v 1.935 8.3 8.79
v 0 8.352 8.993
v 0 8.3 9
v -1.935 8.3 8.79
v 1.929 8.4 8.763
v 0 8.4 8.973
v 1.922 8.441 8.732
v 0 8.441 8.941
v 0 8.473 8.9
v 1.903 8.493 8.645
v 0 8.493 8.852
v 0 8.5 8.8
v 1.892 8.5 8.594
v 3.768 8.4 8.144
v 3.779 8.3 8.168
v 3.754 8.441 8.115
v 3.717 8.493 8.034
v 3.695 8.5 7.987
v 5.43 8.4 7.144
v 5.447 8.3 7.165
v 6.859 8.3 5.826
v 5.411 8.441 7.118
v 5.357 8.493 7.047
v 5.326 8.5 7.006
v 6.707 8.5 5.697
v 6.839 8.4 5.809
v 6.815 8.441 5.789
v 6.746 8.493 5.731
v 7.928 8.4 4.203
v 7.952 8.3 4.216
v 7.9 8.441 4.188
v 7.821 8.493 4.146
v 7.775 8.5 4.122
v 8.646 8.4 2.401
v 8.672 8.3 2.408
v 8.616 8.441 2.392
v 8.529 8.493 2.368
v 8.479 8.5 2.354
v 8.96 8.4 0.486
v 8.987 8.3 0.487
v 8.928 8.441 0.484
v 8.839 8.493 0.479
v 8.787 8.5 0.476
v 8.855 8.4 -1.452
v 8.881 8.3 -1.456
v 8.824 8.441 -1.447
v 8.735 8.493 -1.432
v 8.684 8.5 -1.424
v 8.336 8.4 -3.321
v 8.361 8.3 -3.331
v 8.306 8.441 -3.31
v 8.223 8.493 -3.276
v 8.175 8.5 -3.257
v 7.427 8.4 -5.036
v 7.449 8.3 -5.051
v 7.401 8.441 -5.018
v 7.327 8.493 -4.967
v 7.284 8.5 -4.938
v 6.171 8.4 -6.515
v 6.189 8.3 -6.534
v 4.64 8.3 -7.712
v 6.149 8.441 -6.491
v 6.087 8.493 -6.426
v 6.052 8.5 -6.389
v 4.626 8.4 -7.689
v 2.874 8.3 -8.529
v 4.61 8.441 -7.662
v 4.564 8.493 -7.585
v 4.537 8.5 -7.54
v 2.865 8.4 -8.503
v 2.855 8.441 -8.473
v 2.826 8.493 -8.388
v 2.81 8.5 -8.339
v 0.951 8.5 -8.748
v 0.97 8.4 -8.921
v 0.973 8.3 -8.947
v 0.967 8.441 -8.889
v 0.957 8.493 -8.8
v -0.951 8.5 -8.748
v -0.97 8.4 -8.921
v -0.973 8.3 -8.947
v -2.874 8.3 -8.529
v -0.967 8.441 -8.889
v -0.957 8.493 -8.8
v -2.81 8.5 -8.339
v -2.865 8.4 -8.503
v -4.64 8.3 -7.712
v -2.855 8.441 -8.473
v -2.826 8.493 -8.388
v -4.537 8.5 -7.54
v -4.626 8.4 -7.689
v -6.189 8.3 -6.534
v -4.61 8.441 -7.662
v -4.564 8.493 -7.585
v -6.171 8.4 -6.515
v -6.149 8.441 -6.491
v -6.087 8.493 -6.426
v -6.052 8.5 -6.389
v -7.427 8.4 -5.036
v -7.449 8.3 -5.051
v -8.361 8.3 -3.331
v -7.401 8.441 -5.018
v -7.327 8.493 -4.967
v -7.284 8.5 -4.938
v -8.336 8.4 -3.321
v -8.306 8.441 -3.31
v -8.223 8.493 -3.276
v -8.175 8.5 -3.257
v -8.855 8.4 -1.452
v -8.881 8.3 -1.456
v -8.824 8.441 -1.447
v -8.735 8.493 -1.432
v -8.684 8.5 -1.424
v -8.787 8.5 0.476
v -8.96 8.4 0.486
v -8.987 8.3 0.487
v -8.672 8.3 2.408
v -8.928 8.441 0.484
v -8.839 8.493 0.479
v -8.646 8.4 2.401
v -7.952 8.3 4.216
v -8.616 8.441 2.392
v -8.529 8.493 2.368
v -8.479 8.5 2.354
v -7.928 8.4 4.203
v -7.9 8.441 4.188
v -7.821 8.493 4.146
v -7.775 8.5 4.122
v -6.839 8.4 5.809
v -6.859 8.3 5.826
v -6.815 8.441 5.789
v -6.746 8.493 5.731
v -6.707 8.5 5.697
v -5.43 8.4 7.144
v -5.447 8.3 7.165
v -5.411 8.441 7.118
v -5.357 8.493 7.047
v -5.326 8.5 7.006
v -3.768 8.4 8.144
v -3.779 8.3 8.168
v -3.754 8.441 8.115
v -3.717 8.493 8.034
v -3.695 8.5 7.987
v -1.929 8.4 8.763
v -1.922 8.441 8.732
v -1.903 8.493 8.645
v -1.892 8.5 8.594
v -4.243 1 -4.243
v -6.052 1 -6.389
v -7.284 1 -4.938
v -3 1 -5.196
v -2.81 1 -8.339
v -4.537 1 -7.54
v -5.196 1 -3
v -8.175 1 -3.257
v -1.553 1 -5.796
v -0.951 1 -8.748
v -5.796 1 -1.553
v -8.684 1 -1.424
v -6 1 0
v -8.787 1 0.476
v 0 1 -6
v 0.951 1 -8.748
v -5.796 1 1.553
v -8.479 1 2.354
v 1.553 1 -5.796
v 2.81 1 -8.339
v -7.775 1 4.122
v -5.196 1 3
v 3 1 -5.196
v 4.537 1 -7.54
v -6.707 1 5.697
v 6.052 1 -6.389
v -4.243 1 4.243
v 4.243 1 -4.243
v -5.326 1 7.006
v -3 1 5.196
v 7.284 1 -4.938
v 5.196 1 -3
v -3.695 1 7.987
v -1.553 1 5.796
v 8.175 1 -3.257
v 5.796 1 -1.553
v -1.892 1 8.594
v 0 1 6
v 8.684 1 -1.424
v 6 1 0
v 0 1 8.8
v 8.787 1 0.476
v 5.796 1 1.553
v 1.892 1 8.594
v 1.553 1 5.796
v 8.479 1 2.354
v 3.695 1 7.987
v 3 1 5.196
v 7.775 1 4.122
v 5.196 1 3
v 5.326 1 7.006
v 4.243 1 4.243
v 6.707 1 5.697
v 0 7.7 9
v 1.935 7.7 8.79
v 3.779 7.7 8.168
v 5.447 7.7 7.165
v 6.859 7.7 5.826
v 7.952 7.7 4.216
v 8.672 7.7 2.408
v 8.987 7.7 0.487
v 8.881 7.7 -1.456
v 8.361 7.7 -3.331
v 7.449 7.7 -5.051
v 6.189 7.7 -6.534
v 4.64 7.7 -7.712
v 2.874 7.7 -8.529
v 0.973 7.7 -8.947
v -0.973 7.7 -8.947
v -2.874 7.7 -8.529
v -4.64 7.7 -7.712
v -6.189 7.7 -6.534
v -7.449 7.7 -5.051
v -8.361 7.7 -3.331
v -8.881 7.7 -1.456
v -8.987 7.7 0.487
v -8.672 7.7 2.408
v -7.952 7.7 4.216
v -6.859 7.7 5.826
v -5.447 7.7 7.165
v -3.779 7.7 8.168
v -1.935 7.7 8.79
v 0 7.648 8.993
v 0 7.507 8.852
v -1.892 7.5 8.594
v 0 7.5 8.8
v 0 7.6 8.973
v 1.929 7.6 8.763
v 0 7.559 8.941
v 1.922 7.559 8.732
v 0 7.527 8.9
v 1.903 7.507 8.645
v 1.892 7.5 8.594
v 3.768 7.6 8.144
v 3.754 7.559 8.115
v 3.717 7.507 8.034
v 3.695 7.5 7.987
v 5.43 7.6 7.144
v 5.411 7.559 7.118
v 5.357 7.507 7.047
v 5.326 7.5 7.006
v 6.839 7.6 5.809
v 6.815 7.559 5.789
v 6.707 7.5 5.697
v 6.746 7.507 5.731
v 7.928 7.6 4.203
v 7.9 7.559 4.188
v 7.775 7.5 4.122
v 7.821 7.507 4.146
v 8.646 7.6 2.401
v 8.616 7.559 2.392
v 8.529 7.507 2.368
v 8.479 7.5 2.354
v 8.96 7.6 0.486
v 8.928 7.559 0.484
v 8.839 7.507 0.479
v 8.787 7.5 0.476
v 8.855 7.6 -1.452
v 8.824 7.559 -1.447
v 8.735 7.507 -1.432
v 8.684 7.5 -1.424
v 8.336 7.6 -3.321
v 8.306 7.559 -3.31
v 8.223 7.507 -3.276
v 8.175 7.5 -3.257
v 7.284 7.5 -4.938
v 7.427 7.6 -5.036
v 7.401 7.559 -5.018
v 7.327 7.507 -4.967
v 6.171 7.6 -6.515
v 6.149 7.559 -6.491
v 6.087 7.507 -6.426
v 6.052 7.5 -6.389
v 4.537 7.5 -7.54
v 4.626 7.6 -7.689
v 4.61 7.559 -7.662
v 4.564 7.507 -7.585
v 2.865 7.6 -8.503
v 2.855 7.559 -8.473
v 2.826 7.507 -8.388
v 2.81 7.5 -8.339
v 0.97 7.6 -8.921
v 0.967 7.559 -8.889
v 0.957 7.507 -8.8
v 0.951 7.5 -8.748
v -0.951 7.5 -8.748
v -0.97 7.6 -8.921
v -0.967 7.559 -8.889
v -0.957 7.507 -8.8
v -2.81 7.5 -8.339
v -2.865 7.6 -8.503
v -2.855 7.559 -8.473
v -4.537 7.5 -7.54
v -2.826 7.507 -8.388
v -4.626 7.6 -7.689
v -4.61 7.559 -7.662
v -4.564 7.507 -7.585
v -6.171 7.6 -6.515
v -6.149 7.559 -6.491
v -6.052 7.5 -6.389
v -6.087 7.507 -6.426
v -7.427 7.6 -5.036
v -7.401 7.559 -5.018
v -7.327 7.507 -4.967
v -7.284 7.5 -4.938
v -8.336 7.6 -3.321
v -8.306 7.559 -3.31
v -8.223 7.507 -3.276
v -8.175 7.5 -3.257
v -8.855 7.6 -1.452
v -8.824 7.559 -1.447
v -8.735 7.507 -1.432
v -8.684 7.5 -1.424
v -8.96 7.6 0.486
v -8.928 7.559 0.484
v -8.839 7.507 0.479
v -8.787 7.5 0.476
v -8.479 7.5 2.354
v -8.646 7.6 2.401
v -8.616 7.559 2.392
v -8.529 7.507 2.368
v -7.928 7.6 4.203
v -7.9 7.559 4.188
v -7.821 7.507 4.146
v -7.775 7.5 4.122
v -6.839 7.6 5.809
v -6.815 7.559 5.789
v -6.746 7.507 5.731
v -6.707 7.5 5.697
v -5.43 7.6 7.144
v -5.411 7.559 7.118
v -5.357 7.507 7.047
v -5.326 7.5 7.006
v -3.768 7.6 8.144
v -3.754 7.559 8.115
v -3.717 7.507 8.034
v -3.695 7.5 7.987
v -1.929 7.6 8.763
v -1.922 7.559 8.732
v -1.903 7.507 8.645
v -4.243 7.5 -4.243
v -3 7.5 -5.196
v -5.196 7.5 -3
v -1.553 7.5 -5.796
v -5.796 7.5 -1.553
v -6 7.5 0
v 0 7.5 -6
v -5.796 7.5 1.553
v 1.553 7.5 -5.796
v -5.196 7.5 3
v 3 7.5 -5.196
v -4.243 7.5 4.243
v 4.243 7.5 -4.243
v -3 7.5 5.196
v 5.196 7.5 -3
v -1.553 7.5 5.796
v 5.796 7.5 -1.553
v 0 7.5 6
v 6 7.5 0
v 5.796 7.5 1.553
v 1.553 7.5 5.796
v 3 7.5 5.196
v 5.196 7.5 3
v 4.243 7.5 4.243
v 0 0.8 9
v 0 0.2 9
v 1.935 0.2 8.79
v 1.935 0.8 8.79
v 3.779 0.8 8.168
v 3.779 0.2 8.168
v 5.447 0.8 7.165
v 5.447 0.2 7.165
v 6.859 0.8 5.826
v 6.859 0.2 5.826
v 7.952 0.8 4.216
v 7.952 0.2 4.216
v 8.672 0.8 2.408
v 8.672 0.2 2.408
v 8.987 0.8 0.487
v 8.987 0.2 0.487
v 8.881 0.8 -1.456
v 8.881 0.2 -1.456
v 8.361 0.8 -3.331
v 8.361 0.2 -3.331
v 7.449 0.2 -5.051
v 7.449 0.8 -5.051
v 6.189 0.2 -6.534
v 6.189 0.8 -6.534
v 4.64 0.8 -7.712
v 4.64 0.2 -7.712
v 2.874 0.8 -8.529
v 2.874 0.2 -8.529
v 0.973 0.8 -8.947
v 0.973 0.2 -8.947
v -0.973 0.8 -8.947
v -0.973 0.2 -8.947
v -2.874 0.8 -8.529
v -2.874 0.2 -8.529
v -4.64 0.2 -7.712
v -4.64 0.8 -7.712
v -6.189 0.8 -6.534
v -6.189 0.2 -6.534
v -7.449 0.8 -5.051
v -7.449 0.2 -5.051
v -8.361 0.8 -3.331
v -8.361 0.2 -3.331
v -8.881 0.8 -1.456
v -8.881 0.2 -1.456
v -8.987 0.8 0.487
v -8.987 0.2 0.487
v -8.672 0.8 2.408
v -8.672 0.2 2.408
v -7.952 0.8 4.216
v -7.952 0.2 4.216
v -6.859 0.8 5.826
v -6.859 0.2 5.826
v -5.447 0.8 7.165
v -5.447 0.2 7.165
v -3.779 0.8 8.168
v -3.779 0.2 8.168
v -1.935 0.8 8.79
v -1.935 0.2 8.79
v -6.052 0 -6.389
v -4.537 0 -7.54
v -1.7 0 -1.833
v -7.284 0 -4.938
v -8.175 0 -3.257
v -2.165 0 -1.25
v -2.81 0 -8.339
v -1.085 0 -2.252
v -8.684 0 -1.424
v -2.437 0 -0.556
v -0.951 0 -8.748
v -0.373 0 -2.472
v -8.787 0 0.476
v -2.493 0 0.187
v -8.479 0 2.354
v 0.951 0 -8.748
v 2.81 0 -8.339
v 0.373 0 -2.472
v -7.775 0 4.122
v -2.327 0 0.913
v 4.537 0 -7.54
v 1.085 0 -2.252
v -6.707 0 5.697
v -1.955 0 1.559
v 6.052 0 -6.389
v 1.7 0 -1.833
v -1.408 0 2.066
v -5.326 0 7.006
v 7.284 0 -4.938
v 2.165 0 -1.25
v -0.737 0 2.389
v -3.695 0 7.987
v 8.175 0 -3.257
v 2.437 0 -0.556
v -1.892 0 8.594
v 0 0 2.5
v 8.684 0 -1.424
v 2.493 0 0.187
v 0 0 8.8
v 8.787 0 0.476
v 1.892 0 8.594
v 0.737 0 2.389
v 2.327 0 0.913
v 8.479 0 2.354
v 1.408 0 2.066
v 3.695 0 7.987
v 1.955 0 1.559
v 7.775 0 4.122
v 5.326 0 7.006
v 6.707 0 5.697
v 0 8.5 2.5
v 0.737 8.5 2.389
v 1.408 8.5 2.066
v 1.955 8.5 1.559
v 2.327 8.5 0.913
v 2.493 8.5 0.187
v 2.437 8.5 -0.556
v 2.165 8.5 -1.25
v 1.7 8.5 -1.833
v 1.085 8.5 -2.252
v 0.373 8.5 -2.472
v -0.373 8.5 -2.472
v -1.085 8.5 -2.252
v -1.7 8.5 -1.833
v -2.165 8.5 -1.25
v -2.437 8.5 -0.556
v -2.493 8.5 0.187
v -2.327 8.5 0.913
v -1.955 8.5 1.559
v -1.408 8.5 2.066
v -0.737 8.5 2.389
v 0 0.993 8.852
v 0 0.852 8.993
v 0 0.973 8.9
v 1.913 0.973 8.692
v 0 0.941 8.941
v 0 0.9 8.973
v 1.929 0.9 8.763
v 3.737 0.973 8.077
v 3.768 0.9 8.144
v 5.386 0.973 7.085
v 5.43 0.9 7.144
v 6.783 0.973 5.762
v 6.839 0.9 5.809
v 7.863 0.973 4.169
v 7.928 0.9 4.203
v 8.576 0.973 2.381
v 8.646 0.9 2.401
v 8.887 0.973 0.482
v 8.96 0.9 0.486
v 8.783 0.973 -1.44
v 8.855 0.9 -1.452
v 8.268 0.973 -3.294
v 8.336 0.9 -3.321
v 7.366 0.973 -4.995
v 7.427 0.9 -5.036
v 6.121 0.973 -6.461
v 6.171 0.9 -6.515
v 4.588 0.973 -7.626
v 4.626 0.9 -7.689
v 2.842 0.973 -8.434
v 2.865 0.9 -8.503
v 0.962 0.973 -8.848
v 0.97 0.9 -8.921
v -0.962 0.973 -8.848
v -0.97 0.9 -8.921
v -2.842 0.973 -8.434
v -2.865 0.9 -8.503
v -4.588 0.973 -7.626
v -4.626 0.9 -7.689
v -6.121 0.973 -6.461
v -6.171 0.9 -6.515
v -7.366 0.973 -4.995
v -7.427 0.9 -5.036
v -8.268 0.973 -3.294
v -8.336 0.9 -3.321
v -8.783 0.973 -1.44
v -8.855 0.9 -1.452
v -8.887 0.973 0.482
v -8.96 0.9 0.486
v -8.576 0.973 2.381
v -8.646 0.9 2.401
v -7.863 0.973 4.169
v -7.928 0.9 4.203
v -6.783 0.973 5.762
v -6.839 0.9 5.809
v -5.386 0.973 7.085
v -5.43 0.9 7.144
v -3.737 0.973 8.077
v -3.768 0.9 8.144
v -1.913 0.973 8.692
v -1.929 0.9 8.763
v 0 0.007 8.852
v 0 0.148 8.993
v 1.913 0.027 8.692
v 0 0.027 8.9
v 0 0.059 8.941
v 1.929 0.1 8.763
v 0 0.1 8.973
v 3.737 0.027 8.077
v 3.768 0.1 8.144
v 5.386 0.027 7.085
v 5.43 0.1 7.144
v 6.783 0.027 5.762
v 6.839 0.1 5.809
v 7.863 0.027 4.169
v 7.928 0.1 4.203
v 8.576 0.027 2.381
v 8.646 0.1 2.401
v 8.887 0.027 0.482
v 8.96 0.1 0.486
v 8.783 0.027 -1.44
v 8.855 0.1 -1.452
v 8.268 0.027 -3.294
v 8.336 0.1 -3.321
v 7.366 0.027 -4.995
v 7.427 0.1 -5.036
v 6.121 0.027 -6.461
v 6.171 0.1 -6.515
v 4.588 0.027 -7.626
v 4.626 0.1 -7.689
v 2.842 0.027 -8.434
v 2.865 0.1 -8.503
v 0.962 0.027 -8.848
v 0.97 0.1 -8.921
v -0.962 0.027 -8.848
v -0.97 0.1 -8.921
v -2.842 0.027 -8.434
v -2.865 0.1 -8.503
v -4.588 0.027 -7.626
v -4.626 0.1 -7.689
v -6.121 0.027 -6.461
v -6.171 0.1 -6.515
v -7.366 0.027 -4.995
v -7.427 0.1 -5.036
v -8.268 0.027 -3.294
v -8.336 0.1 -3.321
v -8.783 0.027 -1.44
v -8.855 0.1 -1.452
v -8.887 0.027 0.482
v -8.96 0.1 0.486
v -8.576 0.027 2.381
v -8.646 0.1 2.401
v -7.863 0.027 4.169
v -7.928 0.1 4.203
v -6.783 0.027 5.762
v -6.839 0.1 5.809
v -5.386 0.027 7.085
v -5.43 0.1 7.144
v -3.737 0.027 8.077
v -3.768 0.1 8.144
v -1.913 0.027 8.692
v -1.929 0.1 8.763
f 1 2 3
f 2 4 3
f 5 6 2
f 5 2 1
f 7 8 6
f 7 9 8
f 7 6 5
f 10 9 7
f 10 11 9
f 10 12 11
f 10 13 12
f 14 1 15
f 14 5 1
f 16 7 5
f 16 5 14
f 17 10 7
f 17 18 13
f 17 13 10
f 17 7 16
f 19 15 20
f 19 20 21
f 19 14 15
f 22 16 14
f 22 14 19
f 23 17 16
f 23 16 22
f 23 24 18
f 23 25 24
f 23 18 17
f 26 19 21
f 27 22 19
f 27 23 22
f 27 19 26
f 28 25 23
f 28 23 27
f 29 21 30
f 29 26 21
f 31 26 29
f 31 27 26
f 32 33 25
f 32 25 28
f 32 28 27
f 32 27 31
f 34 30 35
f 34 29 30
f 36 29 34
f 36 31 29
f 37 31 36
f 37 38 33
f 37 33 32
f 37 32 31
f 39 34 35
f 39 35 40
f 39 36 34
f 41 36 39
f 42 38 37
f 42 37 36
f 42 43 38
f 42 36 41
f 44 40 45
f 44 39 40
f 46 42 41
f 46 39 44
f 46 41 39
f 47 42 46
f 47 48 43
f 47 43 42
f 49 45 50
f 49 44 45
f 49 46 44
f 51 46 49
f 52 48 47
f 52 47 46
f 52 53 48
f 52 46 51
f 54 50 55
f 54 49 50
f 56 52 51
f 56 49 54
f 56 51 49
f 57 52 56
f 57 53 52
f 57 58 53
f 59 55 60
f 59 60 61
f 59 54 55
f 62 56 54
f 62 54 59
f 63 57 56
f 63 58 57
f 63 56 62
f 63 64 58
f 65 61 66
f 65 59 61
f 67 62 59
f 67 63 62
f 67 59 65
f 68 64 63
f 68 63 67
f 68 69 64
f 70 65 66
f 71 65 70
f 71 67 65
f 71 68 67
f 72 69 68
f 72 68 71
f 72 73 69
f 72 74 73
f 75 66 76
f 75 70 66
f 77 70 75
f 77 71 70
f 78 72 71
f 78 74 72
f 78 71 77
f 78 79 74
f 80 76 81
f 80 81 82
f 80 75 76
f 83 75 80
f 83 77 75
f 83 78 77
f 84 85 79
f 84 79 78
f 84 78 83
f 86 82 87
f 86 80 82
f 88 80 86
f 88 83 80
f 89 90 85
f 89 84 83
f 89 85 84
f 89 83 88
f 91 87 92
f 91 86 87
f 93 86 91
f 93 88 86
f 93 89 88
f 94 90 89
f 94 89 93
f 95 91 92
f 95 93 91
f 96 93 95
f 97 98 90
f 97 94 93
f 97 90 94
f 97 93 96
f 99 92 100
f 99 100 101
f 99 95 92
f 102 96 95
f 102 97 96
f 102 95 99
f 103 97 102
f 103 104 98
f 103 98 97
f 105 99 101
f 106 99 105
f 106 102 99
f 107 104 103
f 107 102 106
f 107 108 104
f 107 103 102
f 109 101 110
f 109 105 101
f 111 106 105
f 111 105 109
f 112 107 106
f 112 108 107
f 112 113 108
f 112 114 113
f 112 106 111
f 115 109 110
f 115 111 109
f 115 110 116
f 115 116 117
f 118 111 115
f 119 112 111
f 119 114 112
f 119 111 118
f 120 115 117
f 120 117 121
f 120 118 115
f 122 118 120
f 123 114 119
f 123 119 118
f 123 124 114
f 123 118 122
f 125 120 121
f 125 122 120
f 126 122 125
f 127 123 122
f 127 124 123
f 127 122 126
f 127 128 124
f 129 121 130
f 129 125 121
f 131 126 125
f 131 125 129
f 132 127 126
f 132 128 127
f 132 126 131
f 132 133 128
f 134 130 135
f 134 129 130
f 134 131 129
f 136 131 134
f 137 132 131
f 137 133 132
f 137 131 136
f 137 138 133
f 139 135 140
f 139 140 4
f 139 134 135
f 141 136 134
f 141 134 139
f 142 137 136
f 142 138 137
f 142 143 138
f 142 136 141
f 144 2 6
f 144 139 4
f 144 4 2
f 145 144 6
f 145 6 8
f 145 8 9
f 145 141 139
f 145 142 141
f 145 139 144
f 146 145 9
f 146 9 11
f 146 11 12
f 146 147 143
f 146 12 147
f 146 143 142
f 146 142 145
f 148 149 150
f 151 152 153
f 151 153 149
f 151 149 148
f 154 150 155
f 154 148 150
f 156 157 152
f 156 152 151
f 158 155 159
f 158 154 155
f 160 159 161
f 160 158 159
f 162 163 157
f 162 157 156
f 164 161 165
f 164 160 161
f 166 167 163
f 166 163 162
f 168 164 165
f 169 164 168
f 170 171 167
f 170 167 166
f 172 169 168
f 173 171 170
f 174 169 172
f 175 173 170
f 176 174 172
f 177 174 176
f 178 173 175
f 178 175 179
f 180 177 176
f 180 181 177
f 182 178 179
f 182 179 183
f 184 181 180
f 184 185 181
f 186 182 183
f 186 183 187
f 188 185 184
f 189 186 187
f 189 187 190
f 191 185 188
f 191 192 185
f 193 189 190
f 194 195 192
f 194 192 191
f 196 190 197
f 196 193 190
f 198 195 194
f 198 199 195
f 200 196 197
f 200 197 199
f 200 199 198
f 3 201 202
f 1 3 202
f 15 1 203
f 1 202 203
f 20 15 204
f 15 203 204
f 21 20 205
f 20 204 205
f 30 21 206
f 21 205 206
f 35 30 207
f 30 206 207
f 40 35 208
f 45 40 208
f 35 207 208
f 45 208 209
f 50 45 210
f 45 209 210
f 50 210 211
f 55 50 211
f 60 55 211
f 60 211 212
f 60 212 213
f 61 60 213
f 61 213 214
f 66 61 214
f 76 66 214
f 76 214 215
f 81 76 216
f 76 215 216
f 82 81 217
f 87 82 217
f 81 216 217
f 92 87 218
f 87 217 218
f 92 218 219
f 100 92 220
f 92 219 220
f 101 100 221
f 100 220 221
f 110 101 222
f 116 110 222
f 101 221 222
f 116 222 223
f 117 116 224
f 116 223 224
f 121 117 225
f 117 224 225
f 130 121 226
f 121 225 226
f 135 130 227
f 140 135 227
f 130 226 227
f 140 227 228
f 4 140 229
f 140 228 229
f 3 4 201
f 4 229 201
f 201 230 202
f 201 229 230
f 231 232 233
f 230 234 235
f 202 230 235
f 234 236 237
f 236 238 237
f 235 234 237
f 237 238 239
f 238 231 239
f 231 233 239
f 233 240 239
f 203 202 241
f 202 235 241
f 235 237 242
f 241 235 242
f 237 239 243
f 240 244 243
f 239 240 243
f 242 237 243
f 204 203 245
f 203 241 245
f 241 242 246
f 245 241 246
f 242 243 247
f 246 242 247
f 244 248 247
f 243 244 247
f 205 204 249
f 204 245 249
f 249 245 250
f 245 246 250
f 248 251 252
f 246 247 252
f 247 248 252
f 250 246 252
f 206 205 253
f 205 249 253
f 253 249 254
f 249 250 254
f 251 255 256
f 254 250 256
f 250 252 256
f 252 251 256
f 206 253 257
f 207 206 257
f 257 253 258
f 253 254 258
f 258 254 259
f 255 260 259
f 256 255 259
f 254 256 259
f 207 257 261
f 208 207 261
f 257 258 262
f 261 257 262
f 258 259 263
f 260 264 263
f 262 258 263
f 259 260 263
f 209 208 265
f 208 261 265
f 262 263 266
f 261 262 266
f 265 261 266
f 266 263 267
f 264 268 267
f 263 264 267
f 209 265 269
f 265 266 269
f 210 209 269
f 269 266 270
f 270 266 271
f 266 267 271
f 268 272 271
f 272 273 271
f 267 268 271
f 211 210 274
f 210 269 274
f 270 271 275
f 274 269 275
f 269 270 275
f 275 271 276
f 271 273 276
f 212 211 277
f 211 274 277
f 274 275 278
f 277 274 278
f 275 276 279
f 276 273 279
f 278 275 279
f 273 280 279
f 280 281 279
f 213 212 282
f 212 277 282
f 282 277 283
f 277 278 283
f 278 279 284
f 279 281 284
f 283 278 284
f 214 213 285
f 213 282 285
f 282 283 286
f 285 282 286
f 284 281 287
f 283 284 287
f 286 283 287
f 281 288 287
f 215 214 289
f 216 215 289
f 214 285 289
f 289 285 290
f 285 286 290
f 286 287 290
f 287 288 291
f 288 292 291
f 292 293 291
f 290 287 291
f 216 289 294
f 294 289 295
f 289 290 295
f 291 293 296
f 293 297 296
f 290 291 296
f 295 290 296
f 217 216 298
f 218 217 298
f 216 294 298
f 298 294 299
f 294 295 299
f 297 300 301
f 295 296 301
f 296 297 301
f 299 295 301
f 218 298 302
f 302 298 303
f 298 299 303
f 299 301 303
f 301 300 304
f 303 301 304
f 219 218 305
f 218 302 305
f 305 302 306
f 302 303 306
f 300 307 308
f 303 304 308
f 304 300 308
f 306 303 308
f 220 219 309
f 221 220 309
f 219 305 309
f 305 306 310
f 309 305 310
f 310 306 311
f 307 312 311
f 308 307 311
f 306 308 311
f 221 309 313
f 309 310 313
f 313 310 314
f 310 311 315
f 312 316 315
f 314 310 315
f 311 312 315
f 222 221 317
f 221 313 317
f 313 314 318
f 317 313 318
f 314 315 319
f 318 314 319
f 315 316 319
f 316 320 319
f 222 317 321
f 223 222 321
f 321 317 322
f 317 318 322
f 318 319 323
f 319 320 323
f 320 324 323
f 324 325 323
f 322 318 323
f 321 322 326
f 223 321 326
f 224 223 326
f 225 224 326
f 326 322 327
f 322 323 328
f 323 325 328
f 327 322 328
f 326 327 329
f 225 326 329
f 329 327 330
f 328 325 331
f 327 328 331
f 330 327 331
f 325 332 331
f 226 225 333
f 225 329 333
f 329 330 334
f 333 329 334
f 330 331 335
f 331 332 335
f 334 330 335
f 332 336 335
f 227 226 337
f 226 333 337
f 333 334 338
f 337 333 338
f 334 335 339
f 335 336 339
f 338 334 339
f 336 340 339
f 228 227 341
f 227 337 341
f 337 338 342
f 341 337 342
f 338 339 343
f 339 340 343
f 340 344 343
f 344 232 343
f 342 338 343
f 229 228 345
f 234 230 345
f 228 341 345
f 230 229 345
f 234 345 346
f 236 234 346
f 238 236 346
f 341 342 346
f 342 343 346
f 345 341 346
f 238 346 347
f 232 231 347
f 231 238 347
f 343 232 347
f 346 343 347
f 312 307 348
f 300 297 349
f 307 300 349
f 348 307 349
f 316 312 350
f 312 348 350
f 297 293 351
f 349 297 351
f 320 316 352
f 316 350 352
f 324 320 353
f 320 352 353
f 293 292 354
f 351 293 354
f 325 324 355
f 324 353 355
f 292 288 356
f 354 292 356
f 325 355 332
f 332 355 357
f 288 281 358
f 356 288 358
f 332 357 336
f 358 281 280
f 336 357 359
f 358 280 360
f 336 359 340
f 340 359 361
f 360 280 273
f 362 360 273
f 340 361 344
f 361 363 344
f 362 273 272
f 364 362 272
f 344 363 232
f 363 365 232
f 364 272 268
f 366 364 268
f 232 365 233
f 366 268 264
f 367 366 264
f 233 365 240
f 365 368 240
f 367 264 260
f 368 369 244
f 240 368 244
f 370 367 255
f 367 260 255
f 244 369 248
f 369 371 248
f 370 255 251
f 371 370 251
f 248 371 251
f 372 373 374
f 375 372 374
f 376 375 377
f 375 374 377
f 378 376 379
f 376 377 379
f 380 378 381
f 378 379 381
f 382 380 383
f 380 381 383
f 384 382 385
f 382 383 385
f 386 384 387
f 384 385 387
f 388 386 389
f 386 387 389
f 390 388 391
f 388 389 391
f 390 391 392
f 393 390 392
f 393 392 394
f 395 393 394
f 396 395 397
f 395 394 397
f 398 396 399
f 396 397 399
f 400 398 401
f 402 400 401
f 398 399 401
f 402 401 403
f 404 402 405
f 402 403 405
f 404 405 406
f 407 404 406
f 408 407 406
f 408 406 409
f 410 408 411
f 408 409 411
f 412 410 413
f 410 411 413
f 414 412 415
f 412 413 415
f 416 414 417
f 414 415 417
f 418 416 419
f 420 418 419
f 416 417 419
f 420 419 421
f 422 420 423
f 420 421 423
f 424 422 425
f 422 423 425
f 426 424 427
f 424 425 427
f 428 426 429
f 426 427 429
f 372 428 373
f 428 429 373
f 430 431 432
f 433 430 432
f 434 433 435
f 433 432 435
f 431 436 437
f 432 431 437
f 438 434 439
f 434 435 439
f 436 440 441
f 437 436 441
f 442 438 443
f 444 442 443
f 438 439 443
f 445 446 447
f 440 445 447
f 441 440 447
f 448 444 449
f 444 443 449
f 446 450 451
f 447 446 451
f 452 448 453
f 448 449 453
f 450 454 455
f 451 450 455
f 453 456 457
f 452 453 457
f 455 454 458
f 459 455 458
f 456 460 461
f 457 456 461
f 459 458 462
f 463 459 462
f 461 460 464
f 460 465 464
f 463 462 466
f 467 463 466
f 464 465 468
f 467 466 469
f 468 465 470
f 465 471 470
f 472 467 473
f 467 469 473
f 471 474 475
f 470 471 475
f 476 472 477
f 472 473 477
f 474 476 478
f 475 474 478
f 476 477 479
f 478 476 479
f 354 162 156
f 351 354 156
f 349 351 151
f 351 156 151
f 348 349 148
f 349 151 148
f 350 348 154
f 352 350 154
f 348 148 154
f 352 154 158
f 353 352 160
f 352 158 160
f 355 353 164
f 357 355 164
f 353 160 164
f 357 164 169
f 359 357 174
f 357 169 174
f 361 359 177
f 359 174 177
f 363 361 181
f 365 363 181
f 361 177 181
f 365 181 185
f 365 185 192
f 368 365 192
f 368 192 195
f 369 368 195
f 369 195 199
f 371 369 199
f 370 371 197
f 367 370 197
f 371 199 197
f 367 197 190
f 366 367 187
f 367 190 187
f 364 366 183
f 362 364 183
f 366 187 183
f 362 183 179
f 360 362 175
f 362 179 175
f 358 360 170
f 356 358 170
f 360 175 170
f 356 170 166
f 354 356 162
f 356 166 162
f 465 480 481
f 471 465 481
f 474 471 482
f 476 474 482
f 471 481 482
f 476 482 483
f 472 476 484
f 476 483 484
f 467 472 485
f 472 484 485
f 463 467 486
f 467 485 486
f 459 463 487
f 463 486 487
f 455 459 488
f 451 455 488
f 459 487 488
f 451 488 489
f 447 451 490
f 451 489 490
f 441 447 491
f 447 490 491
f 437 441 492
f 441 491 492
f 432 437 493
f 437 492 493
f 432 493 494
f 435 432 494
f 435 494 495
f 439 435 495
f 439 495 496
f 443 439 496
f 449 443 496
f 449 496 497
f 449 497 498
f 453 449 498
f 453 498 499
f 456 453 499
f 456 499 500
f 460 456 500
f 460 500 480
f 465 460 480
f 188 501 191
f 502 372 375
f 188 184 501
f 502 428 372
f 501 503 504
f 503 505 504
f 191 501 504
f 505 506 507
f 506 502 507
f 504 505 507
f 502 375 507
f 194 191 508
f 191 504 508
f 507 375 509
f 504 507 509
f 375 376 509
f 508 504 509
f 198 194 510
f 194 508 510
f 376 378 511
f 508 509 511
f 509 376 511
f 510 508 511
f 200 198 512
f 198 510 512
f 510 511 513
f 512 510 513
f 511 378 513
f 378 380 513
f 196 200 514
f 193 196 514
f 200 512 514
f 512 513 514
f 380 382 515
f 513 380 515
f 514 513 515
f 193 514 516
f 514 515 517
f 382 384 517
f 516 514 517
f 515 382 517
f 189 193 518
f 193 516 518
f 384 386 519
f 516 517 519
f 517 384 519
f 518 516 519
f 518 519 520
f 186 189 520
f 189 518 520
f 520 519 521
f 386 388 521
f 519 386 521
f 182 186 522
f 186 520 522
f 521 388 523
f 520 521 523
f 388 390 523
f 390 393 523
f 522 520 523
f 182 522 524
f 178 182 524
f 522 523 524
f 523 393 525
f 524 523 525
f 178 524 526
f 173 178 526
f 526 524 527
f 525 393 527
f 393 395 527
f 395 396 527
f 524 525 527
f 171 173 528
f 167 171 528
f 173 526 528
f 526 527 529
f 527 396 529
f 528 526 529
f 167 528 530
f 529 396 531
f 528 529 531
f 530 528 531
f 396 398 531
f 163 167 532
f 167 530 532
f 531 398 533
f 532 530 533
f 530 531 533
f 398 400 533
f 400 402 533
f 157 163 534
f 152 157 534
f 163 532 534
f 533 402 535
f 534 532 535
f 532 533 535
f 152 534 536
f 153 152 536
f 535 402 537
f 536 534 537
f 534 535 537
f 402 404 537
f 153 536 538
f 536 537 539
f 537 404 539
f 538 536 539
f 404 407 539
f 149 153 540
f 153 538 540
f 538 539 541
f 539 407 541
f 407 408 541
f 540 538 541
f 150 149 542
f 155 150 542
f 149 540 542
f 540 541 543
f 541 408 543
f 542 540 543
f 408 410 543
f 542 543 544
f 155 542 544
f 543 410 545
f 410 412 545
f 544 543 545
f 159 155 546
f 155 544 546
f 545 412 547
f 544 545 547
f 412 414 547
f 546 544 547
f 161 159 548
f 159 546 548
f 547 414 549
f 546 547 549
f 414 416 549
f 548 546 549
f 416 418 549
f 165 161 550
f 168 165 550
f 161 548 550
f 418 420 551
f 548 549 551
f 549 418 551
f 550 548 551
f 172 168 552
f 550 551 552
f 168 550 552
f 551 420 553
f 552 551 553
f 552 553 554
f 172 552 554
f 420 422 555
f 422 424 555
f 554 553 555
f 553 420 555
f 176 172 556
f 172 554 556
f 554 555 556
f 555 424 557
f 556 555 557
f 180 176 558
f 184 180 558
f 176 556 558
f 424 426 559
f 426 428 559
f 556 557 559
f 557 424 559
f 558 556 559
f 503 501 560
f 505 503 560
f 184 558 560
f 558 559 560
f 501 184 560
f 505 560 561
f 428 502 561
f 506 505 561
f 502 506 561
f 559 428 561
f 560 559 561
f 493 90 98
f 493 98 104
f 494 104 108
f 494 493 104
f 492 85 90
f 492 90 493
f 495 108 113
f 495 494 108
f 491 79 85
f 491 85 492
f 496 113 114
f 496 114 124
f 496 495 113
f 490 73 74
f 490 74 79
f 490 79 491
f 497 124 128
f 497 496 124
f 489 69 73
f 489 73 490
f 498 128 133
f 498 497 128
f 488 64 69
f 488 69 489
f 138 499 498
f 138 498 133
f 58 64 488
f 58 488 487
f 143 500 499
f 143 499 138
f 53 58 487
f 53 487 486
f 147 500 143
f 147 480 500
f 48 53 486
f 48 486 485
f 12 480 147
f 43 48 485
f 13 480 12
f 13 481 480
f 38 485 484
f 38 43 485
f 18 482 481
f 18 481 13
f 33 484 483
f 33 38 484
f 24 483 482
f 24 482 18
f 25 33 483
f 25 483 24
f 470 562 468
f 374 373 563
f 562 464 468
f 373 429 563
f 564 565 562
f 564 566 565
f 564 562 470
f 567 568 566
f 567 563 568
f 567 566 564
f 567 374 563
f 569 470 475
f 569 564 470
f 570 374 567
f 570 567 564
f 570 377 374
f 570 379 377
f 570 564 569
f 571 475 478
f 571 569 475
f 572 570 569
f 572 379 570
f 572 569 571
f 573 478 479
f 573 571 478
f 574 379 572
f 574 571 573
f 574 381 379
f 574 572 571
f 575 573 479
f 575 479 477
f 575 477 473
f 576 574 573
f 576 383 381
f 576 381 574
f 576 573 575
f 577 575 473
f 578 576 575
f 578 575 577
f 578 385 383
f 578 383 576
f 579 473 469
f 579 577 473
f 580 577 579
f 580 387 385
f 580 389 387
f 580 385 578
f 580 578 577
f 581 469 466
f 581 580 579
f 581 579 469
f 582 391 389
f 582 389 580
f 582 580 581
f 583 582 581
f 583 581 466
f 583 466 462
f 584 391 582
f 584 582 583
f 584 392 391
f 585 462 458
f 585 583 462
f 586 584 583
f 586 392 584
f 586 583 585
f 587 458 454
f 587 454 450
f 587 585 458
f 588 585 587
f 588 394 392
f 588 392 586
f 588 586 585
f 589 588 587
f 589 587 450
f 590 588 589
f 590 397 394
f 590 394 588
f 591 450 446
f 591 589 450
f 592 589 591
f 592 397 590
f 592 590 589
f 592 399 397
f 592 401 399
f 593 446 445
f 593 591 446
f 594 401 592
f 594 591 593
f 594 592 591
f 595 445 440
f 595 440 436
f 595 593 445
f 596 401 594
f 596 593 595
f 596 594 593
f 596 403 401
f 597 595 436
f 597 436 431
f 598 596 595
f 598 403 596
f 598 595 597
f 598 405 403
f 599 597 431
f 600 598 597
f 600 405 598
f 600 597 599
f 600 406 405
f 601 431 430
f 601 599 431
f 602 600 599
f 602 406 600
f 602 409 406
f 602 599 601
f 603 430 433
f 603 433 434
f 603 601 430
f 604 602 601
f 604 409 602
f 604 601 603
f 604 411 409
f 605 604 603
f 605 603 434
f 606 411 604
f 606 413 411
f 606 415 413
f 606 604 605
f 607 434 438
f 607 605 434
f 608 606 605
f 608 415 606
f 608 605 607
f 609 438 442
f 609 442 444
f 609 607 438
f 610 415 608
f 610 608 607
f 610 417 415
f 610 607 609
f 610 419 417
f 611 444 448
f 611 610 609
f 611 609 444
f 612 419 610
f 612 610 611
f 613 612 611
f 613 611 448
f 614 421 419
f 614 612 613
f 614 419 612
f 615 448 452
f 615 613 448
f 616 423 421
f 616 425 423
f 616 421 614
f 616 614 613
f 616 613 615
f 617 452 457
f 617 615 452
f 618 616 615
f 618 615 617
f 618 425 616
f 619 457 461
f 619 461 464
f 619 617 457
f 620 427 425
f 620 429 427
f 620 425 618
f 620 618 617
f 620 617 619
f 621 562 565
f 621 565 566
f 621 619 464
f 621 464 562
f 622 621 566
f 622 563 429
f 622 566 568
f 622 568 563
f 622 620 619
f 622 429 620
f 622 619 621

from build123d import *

# Parameters (mm, degrees)
SKETCH1_R           = 9
BOSS_EXTRUDE1_DEPTH = 1
SKETCH2_R           = 6
BOSS_EXTRUDE2_DEPTH = 6.5
SKETCH3_R           = 9
BOSS_EXTRUDE3_DEPTH = 1
SKETCH4_R           = 2.5
CUT_EXTRUDE1_DEPTH  = 16.305227865
FILLET1_R           = 0.2


with BuildPart() as part:
    # Sketch1 → Boss-Extrude1 (new body)
    with BuildSketch(Plane(origin=(0, 0, 0), x_dir=(1, 0, 0), z_dir=(0, 1, 0))):
        with Locations(Location((0, 0, 0), (0, 0, 270))):
            Circle(SKETCH1_R)
    extrude(amount=BOSS_EXTRUDE1_DEPTH)

    # Sketch2 → Boss-Extrude2 (add)
    with BuildSketch(Plane(origin=(0, 1, 0), x_dir=(1, 0, 0), z_dir=(0, 1, 0))):
        with Locations(Location((0, 0, 0), (0, 0, 90))):
            Circle(SKETCH2_R)
    extrude(amount=BOSS_EXTRUDE2_DEPTH)

    # Sketch3 → Boss-Extrude3 (add)
    with BuildSketch(Plane(origin=(0, 7.5, 0), x_dir=(1, 0, 0), z_dir=(0, 1, 0))):
        with Locations(Location((0, 0, 0), (0, 0, 270))):
            Circle(SKETCH3_R)
    extrude(amount=BOSS_EXTRUDE3_DEPTH)

    # Sketch4 → Cut-Extrude1 (cut, through all)
    with BuildSketch(Plane(origin=(0, 8.5, 0), x_dir=(1, 0, 0), z_dir=(0, 1, 0))):
        with Locations(Location((0, 0, 0), (0, 0, 270))):
            Circle(SKETCH4_R)
    extrude(amount=-CUT_EXTRUDE1_DEPTH, mode=Mode.SUBTRACT)

    # Fillet1
    fillet1_edges = [part.edges().sort_by_distance(p)[0] for p in [
        (0, 8.5, -9),
        (0, 0, -9),
        (0, 1, -9),
        (0, 7.5, -9),
    ]]
    fillet(fillet1_edges, radius=FILLET1_R)


solid = part.part
